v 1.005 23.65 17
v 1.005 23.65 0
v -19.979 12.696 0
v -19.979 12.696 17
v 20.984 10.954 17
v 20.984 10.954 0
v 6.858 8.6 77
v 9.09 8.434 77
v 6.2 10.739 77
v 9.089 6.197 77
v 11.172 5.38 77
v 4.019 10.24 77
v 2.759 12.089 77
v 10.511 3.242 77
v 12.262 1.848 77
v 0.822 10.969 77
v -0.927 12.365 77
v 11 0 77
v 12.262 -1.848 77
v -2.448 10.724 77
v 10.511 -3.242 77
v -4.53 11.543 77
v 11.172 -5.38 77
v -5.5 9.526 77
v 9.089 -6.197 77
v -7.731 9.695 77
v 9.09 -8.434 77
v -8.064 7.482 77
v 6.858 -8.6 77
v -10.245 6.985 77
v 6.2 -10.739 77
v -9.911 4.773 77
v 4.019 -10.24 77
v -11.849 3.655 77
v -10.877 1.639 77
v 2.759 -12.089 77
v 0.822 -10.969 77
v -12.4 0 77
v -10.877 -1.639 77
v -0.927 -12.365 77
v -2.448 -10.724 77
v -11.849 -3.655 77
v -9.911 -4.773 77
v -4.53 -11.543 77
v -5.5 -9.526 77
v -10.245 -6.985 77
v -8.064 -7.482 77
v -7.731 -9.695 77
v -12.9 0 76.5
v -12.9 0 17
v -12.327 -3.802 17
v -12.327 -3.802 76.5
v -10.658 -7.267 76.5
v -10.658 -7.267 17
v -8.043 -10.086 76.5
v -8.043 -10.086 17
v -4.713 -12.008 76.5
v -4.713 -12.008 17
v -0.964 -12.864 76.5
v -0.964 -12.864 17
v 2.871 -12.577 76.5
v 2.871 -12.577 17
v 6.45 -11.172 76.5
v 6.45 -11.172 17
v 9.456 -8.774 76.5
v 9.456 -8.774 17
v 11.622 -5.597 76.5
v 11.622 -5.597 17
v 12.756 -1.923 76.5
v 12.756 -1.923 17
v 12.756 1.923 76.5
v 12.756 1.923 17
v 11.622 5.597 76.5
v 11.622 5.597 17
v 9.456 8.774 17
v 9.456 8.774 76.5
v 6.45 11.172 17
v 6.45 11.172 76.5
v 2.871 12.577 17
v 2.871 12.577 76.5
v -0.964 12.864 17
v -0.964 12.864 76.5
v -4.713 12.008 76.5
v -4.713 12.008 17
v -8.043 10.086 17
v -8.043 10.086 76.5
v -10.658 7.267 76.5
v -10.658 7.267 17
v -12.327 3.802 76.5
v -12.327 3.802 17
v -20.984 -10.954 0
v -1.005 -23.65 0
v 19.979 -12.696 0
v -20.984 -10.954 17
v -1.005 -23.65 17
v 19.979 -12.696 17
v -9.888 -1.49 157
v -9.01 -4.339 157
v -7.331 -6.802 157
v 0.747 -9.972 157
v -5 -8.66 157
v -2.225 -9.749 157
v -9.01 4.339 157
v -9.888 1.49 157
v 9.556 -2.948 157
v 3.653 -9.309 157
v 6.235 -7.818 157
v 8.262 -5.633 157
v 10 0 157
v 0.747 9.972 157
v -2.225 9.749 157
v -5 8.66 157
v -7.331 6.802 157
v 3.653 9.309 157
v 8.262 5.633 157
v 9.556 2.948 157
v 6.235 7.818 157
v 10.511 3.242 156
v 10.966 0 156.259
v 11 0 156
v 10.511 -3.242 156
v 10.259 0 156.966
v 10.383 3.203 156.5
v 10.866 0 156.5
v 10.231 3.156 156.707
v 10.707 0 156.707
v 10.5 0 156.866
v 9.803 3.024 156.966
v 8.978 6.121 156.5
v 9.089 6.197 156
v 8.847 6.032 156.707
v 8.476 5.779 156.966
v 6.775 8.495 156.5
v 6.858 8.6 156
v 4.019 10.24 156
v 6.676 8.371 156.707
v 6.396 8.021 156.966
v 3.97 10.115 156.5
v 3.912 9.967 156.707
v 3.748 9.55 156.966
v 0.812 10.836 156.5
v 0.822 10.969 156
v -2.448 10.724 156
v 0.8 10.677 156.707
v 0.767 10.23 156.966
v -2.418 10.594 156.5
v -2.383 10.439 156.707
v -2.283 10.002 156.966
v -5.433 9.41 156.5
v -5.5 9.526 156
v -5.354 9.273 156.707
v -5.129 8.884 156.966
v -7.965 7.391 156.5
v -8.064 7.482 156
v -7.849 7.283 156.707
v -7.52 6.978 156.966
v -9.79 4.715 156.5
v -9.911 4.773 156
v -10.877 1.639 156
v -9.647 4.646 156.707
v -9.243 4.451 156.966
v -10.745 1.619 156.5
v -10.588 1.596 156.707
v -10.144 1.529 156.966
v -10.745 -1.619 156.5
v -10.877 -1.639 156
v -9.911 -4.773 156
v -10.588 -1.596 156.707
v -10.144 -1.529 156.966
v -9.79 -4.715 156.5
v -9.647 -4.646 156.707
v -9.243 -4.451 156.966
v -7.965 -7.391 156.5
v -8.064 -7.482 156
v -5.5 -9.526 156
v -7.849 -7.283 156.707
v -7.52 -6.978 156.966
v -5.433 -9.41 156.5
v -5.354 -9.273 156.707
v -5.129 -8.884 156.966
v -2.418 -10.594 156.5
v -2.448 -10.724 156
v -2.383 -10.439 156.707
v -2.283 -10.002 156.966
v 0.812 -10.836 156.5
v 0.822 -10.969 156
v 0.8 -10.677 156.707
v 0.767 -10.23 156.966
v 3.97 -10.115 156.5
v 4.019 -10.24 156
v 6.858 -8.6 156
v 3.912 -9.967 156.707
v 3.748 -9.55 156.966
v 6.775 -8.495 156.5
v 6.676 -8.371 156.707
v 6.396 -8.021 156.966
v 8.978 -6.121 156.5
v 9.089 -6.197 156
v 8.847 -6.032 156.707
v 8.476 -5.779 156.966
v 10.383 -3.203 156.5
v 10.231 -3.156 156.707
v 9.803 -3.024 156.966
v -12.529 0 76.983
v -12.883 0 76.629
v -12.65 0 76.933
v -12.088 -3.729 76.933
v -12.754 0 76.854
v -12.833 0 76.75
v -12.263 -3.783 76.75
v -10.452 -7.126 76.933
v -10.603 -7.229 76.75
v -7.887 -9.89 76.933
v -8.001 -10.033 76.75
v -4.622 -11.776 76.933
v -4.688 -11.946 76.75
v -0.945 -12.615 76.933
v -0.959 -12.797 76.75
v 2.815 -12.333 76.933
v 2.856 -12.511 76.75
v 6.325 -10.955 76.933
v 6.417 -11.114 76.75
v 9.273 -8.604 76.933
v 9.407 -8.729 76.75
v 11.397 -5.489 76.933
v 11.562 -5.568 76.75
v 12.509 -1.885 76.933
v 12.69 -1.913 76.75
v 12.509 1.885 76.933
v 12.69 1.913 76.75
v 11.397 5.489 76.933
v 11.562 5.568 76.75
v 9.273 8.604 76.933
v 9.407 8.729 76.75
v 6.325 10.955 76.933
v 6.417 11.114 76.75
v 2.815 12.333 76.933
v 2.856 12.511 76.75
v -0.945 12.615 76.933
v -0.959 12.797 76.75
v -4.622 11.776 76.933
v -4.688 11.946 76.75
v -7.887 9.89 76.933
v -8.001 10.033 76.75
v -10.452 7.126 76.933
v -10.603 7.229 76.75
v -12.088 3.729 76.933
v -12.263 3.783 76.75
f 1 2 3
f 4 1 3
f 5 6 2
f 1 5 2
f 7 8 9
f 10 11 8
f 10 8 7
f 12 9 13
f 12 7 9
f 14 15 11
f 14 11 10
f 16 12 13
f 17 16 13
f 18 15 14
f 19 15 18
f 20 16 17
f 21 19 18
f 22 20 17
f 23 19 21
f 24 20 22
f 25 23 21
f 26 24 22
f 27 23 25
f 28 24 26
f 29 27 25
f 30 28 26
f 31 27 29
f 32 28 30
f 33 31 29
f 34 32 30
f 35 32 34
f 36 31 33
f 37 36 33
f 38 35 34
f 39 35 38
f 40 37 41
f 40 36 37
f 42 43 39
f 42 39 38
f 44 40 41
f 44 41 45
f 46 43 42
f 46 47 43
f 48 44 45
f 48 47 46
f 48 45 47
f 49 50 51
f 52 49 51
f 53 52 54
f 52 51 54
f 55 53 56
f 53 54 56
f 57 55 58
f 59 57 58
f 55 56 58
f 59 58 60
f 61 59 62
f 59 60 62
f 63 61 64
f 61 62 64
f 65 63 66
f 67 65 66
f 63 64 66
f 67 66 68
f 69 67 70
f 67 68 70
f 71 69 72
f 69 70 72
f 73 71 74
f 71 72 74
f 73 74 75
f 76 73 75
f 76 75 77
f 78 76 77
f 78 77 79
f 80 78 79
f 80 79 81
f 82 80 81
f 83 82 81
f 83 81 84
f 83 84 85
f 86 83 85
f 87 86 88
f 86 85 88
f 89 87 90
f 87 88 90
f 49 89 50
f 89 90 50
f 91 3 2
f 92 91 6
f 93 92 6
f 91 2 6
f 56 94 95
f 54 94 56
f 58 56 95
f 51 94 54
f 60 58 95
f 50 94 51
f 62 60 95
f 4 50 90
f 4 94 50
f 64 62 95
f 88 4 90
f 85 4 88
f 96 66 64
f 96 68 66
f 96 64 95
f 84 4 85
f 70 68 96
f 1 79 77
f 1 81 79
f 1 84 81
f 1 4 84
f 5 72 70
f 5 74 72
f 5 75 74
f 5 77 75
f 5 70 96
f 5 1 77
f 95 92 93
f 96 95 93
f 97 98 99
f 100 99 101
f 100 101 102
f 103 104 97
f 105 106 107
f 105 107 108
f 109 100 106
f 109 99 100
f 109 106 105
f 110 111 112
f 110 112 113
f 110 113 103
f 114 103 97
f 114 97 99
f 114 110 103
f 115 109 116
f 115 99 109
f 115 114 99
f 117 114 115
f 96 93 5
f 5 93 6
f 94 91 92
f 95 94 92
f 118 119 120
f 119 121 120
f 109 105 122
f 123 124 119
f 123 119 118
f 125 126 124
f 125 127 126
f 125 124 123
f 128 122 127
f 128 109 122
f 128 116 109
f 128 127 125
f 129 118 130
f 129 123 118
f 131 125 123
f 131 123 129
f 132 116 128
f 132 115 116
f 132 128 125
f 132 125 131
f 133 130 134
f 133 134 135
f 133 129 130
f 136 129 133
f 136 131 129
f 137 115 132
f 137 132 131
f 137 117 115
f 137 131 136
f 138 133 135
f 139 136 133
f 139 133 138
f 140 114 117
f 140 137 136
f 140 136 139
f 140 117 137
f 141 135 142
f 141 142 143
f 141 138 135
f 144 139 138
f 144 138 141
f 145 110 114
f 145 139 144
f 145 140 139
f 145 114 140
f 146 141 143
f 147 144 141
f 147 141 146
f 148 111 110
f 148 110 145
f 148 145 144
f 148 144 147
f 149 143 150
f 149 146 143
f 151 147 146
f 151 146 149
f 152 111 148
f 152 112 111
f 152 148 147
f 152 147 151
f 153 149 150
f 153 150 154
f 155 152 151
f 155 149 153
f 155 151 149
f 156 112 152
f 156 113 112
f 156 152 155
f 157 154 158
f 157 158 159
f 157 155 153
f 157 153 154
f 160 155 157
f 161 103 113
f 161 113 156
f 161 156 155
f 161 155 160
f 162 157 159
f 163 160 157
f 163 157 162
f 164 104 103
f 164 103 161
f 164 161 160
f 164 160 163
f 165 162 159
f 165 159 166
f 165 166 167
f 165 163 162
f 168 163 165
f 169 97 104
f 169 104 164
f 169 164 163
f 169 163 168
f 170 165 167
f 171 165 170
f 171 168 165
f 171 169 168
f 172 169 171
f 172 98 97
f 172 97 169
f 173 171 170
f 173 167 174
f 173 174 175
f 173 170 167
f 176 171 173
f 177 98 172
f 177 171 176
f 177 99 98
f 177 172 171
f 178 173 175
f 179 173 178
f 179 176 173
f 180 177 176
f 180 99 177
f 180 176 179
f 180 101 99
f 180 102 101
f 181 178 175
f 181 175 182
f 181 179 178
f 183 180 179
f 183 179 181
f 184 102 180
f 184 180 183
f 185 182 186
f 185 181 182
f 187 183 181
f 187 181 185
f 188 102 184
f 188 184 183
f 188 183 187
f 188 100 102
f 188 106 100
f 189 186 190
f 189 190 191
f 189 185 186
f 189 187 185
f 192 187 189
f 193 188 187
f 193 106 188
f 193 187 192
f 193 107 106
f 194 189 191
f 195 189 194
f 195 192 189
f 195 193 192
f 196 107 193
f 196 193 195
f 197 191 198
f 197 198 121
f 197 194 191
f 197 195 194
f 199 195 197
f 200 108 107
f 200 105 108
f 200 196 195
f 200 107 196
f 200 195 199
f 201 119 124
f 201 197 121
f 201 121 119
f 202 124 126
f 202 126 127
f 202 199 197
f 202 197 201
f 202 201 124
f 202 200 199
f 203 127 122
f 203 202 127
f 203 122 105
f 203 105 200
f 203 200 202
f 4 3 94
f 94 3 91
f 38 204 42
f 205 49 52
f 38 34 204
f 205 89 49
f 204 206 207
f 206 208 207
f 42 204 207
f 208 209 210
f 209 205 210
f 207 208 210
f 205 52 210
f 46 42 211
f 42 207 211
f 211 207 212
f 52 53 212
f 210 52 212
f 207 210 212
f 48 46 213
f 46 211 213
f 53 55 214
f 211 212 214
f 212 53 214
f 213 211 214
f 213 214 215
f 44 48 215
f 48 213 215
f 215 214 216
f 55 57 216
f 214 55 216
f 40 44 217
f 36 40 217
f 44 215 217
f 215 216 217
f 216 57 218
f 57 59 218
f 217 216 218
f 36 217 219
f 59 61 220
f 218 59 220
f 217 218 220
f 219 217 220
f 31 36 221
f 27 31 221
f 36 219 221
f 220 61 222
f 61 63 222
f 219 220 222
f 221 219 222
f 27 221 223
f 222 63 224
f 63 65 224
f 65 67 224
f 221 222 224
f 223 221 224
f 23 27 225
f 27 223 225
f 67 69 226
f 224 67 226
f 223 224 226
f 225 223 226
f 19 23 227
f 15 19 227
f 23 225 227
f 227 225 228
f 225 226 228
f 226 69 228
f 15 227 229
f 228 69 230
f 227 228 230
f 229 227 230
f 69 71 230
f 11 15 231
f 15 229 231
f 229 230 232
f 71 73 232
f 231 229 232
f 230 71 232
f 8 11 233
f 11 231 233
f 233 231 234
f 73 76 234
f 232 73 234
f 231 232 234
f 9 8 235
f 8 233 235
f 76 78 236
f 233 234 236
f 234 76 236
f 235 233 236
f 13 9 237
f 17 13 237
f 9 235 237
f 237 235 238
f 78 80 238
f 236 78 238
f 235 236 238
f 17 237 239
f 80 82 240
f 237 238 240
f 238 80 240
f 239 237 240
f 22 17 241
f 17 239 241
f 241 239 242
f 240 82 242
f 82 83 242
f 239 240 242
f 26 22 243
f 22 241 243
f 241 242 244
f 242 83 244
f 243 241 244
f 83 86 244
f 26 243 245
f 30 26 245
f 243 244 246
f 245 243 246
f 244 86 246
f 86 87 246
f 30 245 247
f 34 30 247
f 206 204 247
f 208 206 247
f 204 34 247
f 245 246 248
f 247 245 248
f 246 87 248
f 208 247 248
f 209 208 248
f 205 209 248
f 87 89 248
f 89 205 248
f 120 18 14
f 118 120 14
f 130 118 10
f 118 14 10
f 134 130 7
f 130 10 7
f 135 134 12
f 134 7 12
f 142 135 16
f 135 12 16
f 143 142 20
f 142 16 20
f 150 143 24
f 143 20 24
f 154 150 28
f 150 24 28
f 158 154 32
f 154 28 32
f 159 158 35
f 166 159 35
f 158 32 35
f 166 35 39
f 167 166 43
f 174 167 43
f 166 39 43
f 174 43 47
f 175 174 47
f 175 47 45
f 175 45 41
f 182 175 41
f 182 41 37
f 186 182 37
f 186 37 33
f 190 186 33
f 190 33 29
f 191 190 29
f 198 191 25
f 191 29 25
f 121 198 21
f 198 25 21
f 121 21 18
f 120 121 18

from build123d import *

# Parameters (mm, degrees)
EXTRUDE_276_DEPTH = 17
SKETCH_2_R        = 12.9
EXTRUDE_1_DEPTH   = 60
SKETCH_3_R        = 11
EXTRUDE_2_DEPTH   = 80
FILLET_2_R        = 1
FILLET_4_R        = 0.5


with BuildPart() as part:
    # 草图1 → Extrude 276 (new body)
    with BuildSketch(Plane.XY):
        Polygon((20.984201837, 10.954296262), (1.005402075, 23.65), (-19.978799762, 12.695703738), (-20.984201837, -10.954296262), (-1.005402075, -23.65), (19.978799762, -12.695703738), align=None)
    extrude(amount=EXTRUDE_276_DEPTH)

    # 草图2 → 凸台-拉伸1 (add)
    with BuildSketch(Plane.XY.offset(17)):
        with Locations(Location((0, 0, 0), (0, 0, 180))):
            Circle(SKETCH_2_R)
    extrude(amount=EXTRUDE_1_DEPTH)

    # 草图3 → 凸台-拉伸2 (add)
    with BuildSketch(Plane.XY.offset(77)):
        Circle(SKETCH_3_R)
    extrude(amount=EXTRUDE_2_DEPTH)

    # 圆角2
    fillet_2_edges = [part.edges().sort_by_distance(p)[0] for p in [
        (-11, 0, 157),
    ]]
    fillet(fillet_2_edges, radius=FILLET_2_R)

    # 圆角4
    fillet_4_edges = [part.edges().sort_by_distance(p)[0] for p in [
        (12.9, 0, 77),
    ]]
    fillet(fillet_4_edges, radius=FILLET_4_R)


solid = part.part
